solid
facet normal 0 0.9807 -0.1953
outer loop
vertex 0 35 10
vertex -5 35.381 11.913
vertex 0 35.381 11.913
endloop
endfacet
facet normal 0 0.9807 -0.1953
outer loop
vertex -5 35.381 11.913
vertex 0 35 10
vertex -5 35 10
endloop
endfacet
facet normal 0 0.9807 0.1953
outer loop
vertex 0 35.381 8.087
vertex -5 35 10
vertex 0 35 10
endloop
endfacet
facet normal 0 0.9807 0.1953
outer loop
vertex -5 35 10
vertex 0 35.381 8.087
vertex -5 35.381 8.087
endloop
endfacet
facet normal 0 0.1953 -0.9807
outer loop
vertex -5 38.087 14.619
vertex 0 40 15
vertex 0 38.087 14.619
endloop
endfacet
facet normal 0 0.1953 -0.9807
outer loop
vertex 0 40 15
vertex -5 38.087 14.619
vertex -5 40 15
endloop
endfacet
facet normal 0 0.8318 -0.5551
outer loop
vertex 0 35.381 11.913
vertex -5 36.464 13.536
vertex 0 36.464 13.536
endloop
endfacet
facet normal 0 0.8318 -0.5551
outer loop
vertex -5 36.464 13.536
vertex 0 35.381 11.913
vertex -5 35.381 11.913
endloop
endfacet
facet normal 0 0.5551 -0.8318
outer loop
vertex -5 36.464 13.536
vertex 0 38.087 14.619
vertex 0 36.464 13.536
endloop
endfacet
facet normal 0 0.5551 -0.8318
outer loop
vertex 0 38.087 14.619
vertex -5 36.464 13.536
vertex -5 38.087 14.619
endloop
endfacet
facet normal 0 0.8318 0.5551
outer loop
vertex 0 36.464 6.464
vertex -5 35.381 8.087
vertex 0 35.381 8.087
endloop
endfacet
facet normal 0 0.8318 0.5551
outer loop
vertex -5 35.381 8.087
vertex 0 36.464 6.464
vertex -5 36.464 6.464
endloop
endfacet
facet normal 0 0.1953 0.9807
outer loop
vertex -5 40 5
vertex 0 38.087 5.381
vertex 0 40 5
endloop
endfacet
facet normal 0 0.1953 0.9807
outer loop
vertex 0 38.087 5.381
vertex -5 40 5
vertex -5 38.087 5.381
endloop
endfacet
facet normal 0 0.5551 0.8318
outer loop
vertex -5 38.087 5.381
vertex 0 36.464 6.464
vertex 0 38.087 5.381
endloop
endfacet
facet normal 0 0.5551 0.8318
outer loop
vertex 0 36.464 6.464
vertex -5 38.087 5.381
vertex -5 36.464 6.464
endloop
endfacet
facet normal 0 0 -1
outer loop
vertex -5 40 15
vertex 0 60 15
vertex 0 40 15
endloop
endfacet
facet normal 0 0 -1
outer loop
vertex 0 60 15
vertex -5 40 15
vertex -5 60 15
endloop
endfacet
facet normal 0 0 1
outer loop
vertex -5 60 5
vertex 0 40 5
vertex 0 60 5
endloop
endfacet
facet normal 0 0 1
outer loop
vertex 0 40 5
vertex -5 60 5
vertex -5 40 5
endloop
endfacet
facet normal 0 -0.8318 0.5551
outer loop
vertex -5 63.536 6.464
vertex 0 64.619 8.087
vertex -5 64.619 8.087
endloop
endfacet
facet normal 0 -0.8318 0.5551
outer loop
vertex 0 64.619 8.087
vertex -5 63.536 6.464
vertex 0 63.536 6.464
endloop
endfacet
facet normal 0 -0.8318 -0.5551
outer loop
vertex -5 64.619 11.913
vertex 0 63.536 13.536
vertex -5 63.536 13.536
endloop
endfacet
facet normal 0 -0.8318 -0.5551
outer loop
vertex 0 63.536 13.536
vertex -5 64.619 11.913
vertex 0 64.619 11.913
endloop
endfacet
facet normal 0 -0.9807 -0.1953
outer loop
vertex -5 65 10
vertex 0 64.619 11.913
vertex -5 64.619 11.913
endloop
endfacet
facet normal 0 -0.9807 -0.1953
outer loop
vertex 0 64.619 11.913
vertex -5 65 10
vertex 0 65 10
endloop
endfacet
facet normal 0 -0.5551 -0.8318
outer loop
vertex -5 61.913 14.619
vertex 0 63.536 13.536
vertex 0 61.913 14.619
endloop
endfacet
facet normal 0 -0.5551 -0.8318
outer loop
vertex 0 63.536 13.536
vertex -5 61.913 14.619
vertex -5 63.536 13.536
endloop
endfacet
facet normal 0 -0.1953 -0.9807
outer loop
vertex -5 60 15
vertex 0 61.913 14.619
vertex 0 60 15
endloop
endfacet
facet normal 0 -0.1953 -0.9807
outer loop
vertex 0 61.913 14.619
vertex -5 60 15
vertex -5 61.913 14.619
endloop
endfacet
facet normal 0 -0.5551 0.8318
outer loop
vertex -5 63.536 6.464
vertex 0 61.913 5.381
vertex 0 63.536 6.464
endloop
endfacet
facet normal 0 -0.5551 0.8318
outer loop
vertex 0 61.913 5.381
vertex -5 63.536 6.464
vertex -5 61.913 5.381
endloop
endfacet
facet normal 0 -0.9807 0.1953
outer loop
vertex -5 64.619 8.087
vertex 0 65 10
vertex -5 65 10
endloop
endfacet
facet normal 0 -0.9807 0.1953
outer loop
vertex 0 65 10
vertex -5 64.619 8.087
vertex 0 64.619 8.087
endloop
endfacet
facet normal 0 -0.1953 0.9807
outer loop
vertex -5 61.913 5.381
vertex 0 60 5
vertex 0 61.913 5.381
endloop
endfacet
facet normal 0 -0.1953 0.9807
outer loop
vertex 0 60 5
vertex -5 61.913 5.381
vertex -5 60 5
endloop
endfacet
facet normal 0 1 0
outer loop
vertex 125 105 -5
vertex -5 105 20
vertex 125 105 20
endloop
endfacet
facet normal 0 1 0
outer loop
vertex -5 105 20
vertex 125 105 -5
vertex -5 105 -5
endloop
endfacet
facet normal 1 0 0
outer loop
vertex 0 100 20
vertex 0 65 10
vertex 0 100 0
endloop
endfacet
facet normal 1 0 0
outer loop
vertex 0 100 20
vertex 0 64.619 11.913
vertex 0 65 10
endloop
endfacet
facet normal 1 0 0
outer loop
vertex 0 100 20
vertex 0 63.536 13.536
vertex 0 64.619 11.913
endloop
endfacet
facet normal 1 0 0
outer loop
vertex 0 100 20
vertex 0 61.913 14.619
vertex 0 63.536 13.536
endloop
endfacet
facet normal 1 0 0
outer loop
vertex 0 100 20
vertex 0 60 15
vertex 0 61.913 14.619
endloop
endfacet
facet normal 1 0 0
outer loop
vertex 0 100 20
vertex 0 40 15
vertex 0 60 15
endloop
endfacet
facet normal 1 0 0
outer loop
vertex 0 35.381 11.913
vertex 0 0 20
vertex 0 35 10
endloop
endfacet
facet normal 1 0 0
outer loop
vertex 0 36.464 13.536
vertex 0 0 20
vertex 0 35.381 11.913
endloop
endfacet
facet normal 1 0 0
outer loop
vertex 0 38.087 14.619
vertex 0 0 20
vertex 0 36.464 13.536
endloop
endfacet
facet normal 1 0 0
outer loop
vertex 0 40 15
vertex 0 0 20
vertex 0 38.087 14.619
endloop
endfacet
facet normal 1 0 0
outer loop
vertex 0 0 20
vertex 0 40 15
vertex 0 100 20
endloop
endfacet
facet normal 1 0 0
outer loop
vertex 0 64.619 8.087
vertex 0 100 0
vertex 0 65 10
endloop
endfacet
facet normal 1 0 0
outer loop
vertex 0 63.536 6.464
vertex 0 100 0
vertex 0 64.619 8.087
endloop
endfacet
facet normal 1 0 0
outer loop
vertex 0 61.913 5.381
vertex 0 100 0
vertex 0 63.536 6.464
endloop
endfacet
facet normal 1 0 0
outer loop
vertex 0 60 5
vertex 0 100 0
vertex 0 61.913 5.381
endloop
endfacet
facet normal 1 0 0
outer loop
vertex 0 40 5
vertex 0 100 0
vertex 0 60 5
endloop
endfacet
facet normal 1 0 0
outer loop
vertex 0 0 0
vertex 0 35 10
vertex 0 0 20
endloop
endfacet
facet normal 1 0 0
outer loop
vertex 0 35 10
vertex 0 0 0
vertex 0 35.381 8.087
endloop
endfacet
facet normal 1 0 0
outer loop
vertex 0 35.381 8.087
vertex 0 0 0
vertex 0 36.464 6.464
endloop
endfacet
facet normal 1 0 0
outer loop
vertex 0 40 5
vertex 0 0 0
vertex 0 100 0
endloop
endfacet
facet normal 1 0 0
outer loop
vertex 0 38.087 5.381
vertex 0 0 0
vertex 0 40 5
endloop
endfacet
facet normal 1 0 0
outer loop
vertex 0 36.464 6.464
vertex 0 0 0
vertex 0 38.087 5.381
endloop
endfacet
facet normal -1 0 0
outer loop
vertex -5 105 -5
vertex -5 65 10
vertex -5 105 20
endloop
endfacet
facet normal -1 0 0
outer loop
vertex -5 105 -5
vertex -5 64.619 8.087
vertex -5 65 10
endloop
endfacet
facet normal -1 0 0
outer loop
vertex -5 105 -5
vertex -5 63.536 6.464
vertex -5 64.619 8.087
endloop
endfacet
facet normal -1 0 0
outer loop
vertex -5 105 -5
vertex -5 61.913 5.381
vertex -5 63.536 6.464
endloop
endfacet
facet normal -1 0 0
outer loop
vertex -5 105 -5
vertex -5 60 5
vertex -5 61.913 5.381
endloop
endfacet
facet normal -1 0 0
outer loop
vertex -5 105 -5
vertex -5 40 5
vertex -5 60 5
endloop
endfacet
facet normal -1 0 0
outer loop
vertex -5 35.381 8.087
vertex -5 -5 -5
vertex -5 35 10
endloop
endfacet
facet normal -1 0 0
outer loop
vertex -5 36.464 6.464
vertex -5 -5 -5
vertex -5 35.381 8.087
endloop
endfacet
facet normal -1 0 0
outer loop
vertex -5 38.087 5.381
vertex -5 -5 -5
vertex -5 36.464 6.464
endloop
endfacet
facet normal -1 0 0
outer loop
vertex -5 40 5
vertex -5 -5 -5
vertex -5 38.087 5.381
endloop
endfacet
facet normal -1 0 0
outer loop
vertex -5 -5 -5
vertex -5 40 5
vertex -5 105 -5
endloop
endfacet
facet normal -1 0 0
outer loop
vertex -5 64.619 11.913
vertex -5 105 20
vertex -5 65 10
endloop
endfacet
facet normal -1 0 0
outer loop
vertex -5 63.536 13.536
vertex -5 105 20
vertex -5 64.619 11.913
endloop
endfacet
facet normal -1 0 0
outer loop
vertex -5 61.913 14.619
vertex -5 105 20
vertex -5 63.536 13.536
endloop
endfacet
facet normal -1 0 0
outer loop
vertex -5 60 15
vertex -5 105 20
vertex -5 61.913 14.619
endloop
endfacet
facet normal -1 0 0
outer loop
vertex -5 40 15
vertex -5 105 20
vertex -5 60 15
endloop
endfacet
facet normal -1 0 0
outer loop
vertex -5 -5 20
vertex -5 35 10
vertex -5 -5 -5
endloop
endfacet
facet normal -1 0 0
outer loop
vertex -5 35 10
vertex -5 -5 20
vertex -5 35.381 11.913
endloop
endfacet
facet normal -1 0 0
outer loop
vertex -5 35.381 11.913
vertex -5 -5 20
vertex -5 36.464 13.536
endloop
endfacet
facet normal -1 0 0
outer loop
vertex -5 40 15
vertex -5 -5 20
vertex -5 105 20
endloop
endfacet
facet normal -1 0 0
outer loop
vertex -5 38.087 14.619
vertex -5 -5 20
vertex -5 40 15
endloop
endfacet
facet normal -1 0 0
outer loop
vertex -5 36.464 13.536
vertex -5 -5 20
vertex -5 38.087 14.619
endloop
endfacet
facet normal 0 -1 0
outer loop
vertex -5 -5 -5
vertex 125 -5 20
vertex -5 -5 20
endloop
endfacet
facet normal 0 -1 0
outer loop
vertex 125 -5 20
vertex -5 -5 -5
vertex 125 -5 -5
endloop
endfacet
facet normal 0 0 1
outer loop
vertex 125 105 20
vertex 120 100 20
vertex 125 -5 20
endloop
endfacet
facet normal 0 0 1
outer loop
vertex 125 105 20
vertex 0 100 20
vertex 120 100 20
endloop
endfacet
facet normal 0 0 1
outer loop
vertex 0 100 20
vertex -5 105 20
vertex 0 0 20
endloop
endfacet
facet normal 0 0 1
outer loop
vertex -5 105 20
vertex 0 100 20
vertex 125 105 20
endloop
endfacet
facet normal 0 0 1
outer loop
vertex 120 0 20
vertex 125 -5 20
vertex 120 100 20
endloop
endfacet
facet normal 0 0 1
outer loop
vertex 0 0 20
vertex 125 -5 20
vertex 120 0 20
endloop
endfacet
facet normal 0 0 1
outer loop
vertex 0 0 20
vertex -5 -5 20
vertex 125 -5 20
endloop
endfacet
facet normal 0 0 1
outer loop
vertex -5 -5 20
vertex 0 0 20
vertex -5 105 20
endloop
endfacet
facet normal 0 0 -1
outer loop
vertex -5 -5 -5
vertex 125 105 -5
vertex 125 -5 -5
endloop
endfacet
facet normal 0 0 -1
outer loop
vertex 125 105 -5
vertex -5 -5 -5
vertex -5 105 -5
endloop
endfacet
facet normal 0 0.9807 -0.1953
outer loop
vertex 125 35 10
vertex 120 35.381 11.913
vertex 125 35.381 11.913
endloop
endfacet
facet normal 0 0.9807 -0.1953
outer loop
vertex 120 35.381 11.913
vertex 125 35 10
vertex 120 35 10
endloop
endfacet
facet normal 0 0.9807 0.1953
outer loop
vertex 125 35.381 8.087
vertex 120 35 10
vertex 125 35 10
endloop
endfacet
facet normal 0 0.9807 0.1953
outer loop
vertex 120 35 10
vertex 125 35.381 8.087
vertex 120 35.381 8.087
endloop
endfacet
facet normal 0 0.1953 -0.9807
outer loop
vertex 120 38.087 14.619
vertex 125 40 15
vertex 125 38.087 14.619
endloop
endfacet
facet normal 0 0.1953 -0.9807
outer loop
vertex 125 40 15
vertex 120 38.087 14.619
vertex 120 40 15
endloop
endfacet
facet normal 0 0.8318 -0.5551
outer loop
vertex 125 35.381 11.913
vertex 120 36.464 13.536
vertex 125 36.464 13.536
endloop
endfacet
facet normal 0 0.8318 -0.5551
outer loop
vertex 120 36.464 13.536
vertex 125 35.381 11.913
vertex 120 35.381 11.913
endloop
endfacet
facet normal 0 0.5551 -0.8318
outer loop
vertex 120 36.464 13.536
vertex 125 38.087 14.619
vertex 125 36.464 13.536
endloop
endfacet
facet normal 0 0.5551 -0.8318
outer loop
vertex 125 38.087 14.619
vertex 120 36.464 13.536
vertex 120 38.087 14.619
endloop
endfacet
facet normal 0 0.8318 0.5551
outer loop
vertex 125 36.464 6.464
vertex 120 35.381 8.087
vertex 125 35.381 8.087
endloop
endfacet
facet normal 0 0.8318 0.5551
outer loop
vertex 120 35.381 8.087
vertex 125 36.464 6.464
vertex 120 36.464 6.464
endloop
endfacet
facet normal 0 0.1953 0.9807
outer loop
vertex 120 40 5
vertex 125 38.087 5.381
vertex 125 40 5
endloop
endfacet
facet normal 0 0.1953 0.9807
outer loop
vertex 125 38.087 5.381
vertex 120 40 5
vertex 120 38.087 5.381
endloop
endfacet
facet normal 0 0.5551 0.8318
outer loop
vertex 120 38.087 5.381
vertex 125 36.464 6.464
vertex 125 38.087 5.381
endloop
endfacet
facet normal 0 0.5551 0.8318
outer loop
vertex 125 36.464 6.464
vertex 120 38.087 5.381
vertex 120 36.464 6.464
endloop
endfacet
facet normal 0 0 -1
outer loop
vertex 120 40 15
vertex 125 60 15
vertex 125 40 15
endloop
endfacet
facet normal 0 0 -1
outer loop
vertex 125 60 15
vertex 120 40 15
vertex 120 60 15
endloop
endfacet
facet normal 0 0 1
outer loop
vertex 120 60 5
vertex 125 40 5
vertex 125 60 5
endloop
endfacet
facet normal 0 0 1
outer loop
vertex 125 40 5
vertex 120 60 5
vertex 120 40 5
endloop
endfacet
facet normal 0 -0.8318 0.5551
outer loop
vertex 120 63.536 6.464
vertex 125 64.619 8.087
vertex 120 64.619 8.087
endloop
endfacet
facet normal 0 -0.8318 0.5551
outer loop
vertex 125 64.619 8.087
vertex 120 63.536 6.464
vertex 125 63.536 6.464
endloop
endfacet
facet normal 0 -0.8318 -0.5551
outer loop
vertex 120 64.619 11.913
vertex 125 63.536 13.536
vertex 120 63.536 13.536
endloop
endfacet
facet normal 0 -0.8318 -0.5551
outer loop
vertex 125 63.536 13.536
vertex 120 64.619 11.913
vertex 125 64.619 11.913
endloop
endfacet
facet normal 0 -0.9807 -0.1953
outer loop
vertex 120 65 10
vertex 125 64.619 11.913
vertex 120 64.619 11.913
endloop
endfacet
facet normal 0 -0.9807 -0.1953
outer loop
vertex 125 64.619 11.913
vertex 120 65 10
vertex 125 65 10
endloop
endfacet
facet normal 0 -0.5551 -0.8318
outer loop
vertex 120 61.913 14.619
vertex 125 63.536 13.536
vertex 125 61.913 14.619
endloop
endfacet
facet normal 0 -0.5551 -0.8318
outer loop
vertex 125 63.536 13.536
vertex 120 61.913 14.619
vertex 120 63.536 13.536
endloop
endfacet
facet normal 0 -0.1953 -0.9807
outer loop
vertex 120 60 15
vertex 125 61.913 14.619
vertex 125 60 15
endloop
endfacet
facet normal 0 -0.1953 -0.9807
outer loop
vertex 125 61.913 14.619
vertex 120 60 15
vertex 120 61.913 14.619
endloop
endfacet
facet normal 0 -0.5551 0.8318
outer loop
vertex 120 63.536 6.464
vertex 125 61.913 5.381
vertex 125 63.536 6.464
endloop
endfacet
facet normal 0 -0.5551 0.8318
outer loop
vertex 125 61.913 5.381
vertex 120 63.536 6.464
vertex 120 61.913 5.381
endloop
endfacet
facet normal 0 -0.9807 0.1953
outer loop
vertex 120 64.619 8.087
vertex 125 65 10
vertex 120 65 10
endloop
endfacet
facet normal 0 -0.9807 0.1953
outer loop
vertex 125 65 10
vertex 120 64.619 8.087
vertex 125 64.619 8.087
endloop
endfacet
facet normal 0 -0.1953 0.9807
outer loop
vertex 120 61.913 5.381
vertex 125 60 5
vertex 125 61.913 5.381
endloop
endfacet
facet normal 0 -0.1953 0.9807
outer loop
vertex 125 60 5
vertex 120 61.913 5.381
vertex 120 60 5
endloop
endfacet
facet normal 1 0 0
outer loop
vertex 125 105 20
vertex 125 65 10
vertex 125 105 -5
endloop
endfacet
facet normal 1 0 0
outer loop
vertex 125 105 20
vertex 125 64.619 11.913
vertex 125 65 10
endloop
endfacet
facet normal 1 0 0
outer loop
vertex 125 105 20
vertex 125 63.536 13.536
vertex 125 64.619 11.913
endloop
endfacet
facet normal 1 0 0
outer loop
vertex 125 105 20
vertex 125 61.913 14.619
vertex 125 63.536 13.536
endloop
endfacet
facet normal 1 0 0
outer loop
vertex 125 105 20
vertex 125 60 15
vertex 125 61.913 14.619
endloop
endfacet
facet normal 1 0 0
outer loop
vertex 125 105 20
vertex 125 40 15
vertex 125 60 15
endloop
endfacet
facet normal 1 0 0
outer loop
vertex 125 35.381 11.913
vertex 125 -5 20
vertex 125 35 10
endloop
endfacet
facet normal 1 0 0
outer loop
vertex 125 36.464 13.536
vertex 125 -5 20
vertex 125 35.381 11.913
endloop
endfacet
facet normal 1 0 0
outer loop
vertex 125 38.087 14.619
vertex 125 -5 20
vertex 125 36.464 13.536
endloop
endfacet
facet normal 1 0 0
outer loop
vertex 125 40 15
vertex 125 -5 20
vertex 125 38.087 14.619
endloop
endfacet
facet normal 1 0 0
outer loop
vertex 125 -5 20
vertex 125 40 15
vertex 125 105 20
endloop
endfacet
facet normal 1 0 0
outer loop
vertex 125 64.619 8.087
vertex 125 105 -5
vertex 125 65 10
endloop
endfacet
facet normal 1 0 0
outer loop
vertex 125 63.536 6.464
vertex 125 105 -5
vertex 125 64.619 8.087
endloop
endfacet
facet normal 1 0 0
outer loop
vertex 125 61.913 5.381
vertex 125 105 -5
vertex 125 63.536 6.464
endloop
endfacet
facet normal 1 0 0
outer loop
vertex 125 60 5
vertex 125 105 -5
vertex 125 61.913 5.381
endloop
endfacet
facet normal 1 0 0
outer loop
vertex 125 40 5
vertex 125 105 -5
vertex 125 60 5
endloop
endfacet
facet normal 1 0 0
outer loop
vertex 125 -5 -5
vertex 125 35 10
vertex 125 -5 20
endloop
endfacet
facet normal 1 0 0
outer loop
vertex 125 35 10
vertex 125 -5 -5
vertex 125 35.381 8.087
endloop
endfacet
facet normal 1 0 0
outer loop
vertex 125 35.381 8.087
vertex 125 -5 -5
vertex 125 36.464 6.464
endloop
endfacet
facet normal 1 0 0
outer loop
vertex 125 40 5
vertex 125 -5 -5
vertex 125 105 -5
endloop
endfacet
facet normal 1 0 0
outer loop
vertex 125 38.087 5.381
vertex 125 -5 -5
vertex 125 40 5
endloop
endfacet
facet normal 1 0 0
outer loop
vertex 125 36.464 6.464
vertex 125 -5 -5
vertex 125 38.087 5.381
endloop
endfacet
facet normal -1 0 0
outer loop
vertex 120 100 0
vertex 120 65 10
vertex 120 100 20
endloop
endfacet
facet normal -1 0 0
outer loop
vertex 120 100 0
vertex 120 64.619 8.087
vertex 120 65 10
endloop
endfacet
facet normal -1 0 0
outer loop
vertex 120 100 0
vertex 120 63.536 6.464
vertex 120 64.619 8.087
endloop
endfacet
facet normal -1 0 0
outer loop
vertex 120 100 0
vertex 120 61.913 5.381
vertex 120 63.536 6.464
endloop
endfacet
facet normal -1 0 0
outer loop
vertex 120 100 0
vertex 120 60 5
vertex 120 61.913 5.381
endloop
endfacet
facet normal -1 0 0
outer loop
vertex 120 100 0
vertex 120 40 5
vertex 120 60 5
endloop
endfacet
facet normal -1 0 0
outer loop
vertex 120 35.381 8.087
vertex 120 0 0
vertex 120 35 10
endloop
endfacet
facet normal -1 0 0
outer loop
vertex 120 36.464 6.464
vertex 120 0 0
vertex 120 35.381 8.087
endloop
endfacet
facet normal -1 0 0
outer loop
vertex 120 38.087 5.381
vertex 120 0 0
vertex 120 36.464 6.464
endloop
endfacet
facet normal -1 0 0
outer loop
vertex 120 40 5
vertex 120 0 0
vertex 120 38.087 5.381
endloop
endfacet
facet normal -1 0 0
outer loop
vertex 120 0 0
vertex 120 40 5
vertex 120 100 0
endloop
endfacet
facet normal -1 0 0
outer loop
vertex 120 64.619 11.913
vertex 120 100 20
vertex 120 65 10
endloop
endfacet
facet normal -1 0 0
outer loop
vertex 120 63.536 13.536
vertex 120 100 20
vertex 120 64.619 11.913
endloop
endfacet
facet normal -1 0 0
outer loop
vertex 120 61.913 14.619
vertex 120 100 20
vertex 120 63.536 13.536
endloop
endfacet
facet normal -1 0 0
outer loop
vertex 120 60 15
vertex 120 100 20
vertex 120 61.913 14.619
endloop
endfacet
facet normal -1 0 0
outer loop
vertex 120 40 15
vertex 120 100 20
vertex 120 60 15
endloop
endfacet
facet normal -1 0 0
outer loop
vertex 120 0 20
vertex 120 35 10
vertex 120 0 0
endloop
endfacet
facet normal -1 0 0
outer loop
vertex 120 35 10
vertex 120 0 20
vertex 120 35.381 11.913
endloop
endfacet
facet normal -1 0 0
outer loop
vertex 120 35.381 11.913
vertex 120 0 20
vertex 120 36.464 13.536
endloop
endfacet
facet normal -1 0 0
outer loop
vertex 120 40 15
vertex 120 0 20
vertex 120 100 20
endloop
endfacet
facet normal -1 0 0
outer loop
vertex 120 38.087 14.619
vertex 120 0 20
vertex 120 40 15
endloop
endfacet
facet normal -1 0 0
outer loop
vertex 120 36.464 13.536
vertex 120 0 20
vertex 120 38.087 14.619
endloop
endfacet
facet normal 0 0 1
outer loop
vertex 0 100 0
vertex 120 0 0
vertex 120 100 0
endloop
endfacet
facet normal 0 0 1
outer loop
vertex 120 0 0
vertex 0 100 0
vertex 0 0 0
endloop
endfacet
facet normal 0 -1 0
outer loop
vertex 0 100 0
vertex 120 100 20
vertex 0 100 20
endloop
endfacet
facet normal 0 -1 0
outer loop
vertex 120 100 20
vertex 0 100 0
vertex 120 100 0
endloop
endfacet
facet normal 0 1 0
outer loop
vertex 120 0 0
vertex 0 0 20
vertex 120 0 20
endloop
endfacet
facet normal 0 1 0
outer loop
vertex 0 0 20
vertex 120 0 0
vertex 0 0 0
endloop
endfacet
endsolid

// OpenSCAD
/**
 * Copyright 2018 Nathan Fairhurst.
 */

module handled_edge(
  depth,
  width,
  wall_thickness,
  handle_width,
  handle_height,
) {
  difference() {
    translate([-wall_thickness,-wall_thickness,0])
      cube([width + wall_thickness * 2, depth + wall_thickness, wall_thickness]);
    if (handle_width && handle_height)
      translate([(width - handle_width + handle_height) / 2, depth / 2, -wall_thickness / 2]) {
        cylinder(wall_thickness * 2, handle_height / 2, handle_height / 2);
        translate([0, -handle_height / 2, 0])
          cube([handle_width - handle_height, handle_height, wall_thickness * 2]);
        translate([handle_width - handle_height, 0, 0])
          cylinder(wall_thickness * 2, handle_height / 2, handle_height / 2);
    }
  }
}

module drawer(
  depth,
  width,
  height,
  wall_thickness,
  handle_width,
  handle_height
) {
  translate([0, 0, -wall_thickness])
    cube([width, height, wall_thickness]);
  rotate([90, 0, 0])
    handled_edge(depth, width, wall_thickness);
  translate([0, height + wall_thickness, 0])
    rotate([90, 0, 0]) 
      handled_edge(depth, width, wall_thickness);
  translate([-wall_thickness, 0, 0])
    rotate([90, 0, 90])
      handled_edge(depth, height, wall_thickness, handle_width, handle_height);
  translate([width, 0, 0])
    rotate([90, 0, 90])
      handled_edge(depth, height, wall_thickness, handle_width, handle_height);
}

drawer(
  20,
  120,
  100,
  5,
  30,
  10
);
